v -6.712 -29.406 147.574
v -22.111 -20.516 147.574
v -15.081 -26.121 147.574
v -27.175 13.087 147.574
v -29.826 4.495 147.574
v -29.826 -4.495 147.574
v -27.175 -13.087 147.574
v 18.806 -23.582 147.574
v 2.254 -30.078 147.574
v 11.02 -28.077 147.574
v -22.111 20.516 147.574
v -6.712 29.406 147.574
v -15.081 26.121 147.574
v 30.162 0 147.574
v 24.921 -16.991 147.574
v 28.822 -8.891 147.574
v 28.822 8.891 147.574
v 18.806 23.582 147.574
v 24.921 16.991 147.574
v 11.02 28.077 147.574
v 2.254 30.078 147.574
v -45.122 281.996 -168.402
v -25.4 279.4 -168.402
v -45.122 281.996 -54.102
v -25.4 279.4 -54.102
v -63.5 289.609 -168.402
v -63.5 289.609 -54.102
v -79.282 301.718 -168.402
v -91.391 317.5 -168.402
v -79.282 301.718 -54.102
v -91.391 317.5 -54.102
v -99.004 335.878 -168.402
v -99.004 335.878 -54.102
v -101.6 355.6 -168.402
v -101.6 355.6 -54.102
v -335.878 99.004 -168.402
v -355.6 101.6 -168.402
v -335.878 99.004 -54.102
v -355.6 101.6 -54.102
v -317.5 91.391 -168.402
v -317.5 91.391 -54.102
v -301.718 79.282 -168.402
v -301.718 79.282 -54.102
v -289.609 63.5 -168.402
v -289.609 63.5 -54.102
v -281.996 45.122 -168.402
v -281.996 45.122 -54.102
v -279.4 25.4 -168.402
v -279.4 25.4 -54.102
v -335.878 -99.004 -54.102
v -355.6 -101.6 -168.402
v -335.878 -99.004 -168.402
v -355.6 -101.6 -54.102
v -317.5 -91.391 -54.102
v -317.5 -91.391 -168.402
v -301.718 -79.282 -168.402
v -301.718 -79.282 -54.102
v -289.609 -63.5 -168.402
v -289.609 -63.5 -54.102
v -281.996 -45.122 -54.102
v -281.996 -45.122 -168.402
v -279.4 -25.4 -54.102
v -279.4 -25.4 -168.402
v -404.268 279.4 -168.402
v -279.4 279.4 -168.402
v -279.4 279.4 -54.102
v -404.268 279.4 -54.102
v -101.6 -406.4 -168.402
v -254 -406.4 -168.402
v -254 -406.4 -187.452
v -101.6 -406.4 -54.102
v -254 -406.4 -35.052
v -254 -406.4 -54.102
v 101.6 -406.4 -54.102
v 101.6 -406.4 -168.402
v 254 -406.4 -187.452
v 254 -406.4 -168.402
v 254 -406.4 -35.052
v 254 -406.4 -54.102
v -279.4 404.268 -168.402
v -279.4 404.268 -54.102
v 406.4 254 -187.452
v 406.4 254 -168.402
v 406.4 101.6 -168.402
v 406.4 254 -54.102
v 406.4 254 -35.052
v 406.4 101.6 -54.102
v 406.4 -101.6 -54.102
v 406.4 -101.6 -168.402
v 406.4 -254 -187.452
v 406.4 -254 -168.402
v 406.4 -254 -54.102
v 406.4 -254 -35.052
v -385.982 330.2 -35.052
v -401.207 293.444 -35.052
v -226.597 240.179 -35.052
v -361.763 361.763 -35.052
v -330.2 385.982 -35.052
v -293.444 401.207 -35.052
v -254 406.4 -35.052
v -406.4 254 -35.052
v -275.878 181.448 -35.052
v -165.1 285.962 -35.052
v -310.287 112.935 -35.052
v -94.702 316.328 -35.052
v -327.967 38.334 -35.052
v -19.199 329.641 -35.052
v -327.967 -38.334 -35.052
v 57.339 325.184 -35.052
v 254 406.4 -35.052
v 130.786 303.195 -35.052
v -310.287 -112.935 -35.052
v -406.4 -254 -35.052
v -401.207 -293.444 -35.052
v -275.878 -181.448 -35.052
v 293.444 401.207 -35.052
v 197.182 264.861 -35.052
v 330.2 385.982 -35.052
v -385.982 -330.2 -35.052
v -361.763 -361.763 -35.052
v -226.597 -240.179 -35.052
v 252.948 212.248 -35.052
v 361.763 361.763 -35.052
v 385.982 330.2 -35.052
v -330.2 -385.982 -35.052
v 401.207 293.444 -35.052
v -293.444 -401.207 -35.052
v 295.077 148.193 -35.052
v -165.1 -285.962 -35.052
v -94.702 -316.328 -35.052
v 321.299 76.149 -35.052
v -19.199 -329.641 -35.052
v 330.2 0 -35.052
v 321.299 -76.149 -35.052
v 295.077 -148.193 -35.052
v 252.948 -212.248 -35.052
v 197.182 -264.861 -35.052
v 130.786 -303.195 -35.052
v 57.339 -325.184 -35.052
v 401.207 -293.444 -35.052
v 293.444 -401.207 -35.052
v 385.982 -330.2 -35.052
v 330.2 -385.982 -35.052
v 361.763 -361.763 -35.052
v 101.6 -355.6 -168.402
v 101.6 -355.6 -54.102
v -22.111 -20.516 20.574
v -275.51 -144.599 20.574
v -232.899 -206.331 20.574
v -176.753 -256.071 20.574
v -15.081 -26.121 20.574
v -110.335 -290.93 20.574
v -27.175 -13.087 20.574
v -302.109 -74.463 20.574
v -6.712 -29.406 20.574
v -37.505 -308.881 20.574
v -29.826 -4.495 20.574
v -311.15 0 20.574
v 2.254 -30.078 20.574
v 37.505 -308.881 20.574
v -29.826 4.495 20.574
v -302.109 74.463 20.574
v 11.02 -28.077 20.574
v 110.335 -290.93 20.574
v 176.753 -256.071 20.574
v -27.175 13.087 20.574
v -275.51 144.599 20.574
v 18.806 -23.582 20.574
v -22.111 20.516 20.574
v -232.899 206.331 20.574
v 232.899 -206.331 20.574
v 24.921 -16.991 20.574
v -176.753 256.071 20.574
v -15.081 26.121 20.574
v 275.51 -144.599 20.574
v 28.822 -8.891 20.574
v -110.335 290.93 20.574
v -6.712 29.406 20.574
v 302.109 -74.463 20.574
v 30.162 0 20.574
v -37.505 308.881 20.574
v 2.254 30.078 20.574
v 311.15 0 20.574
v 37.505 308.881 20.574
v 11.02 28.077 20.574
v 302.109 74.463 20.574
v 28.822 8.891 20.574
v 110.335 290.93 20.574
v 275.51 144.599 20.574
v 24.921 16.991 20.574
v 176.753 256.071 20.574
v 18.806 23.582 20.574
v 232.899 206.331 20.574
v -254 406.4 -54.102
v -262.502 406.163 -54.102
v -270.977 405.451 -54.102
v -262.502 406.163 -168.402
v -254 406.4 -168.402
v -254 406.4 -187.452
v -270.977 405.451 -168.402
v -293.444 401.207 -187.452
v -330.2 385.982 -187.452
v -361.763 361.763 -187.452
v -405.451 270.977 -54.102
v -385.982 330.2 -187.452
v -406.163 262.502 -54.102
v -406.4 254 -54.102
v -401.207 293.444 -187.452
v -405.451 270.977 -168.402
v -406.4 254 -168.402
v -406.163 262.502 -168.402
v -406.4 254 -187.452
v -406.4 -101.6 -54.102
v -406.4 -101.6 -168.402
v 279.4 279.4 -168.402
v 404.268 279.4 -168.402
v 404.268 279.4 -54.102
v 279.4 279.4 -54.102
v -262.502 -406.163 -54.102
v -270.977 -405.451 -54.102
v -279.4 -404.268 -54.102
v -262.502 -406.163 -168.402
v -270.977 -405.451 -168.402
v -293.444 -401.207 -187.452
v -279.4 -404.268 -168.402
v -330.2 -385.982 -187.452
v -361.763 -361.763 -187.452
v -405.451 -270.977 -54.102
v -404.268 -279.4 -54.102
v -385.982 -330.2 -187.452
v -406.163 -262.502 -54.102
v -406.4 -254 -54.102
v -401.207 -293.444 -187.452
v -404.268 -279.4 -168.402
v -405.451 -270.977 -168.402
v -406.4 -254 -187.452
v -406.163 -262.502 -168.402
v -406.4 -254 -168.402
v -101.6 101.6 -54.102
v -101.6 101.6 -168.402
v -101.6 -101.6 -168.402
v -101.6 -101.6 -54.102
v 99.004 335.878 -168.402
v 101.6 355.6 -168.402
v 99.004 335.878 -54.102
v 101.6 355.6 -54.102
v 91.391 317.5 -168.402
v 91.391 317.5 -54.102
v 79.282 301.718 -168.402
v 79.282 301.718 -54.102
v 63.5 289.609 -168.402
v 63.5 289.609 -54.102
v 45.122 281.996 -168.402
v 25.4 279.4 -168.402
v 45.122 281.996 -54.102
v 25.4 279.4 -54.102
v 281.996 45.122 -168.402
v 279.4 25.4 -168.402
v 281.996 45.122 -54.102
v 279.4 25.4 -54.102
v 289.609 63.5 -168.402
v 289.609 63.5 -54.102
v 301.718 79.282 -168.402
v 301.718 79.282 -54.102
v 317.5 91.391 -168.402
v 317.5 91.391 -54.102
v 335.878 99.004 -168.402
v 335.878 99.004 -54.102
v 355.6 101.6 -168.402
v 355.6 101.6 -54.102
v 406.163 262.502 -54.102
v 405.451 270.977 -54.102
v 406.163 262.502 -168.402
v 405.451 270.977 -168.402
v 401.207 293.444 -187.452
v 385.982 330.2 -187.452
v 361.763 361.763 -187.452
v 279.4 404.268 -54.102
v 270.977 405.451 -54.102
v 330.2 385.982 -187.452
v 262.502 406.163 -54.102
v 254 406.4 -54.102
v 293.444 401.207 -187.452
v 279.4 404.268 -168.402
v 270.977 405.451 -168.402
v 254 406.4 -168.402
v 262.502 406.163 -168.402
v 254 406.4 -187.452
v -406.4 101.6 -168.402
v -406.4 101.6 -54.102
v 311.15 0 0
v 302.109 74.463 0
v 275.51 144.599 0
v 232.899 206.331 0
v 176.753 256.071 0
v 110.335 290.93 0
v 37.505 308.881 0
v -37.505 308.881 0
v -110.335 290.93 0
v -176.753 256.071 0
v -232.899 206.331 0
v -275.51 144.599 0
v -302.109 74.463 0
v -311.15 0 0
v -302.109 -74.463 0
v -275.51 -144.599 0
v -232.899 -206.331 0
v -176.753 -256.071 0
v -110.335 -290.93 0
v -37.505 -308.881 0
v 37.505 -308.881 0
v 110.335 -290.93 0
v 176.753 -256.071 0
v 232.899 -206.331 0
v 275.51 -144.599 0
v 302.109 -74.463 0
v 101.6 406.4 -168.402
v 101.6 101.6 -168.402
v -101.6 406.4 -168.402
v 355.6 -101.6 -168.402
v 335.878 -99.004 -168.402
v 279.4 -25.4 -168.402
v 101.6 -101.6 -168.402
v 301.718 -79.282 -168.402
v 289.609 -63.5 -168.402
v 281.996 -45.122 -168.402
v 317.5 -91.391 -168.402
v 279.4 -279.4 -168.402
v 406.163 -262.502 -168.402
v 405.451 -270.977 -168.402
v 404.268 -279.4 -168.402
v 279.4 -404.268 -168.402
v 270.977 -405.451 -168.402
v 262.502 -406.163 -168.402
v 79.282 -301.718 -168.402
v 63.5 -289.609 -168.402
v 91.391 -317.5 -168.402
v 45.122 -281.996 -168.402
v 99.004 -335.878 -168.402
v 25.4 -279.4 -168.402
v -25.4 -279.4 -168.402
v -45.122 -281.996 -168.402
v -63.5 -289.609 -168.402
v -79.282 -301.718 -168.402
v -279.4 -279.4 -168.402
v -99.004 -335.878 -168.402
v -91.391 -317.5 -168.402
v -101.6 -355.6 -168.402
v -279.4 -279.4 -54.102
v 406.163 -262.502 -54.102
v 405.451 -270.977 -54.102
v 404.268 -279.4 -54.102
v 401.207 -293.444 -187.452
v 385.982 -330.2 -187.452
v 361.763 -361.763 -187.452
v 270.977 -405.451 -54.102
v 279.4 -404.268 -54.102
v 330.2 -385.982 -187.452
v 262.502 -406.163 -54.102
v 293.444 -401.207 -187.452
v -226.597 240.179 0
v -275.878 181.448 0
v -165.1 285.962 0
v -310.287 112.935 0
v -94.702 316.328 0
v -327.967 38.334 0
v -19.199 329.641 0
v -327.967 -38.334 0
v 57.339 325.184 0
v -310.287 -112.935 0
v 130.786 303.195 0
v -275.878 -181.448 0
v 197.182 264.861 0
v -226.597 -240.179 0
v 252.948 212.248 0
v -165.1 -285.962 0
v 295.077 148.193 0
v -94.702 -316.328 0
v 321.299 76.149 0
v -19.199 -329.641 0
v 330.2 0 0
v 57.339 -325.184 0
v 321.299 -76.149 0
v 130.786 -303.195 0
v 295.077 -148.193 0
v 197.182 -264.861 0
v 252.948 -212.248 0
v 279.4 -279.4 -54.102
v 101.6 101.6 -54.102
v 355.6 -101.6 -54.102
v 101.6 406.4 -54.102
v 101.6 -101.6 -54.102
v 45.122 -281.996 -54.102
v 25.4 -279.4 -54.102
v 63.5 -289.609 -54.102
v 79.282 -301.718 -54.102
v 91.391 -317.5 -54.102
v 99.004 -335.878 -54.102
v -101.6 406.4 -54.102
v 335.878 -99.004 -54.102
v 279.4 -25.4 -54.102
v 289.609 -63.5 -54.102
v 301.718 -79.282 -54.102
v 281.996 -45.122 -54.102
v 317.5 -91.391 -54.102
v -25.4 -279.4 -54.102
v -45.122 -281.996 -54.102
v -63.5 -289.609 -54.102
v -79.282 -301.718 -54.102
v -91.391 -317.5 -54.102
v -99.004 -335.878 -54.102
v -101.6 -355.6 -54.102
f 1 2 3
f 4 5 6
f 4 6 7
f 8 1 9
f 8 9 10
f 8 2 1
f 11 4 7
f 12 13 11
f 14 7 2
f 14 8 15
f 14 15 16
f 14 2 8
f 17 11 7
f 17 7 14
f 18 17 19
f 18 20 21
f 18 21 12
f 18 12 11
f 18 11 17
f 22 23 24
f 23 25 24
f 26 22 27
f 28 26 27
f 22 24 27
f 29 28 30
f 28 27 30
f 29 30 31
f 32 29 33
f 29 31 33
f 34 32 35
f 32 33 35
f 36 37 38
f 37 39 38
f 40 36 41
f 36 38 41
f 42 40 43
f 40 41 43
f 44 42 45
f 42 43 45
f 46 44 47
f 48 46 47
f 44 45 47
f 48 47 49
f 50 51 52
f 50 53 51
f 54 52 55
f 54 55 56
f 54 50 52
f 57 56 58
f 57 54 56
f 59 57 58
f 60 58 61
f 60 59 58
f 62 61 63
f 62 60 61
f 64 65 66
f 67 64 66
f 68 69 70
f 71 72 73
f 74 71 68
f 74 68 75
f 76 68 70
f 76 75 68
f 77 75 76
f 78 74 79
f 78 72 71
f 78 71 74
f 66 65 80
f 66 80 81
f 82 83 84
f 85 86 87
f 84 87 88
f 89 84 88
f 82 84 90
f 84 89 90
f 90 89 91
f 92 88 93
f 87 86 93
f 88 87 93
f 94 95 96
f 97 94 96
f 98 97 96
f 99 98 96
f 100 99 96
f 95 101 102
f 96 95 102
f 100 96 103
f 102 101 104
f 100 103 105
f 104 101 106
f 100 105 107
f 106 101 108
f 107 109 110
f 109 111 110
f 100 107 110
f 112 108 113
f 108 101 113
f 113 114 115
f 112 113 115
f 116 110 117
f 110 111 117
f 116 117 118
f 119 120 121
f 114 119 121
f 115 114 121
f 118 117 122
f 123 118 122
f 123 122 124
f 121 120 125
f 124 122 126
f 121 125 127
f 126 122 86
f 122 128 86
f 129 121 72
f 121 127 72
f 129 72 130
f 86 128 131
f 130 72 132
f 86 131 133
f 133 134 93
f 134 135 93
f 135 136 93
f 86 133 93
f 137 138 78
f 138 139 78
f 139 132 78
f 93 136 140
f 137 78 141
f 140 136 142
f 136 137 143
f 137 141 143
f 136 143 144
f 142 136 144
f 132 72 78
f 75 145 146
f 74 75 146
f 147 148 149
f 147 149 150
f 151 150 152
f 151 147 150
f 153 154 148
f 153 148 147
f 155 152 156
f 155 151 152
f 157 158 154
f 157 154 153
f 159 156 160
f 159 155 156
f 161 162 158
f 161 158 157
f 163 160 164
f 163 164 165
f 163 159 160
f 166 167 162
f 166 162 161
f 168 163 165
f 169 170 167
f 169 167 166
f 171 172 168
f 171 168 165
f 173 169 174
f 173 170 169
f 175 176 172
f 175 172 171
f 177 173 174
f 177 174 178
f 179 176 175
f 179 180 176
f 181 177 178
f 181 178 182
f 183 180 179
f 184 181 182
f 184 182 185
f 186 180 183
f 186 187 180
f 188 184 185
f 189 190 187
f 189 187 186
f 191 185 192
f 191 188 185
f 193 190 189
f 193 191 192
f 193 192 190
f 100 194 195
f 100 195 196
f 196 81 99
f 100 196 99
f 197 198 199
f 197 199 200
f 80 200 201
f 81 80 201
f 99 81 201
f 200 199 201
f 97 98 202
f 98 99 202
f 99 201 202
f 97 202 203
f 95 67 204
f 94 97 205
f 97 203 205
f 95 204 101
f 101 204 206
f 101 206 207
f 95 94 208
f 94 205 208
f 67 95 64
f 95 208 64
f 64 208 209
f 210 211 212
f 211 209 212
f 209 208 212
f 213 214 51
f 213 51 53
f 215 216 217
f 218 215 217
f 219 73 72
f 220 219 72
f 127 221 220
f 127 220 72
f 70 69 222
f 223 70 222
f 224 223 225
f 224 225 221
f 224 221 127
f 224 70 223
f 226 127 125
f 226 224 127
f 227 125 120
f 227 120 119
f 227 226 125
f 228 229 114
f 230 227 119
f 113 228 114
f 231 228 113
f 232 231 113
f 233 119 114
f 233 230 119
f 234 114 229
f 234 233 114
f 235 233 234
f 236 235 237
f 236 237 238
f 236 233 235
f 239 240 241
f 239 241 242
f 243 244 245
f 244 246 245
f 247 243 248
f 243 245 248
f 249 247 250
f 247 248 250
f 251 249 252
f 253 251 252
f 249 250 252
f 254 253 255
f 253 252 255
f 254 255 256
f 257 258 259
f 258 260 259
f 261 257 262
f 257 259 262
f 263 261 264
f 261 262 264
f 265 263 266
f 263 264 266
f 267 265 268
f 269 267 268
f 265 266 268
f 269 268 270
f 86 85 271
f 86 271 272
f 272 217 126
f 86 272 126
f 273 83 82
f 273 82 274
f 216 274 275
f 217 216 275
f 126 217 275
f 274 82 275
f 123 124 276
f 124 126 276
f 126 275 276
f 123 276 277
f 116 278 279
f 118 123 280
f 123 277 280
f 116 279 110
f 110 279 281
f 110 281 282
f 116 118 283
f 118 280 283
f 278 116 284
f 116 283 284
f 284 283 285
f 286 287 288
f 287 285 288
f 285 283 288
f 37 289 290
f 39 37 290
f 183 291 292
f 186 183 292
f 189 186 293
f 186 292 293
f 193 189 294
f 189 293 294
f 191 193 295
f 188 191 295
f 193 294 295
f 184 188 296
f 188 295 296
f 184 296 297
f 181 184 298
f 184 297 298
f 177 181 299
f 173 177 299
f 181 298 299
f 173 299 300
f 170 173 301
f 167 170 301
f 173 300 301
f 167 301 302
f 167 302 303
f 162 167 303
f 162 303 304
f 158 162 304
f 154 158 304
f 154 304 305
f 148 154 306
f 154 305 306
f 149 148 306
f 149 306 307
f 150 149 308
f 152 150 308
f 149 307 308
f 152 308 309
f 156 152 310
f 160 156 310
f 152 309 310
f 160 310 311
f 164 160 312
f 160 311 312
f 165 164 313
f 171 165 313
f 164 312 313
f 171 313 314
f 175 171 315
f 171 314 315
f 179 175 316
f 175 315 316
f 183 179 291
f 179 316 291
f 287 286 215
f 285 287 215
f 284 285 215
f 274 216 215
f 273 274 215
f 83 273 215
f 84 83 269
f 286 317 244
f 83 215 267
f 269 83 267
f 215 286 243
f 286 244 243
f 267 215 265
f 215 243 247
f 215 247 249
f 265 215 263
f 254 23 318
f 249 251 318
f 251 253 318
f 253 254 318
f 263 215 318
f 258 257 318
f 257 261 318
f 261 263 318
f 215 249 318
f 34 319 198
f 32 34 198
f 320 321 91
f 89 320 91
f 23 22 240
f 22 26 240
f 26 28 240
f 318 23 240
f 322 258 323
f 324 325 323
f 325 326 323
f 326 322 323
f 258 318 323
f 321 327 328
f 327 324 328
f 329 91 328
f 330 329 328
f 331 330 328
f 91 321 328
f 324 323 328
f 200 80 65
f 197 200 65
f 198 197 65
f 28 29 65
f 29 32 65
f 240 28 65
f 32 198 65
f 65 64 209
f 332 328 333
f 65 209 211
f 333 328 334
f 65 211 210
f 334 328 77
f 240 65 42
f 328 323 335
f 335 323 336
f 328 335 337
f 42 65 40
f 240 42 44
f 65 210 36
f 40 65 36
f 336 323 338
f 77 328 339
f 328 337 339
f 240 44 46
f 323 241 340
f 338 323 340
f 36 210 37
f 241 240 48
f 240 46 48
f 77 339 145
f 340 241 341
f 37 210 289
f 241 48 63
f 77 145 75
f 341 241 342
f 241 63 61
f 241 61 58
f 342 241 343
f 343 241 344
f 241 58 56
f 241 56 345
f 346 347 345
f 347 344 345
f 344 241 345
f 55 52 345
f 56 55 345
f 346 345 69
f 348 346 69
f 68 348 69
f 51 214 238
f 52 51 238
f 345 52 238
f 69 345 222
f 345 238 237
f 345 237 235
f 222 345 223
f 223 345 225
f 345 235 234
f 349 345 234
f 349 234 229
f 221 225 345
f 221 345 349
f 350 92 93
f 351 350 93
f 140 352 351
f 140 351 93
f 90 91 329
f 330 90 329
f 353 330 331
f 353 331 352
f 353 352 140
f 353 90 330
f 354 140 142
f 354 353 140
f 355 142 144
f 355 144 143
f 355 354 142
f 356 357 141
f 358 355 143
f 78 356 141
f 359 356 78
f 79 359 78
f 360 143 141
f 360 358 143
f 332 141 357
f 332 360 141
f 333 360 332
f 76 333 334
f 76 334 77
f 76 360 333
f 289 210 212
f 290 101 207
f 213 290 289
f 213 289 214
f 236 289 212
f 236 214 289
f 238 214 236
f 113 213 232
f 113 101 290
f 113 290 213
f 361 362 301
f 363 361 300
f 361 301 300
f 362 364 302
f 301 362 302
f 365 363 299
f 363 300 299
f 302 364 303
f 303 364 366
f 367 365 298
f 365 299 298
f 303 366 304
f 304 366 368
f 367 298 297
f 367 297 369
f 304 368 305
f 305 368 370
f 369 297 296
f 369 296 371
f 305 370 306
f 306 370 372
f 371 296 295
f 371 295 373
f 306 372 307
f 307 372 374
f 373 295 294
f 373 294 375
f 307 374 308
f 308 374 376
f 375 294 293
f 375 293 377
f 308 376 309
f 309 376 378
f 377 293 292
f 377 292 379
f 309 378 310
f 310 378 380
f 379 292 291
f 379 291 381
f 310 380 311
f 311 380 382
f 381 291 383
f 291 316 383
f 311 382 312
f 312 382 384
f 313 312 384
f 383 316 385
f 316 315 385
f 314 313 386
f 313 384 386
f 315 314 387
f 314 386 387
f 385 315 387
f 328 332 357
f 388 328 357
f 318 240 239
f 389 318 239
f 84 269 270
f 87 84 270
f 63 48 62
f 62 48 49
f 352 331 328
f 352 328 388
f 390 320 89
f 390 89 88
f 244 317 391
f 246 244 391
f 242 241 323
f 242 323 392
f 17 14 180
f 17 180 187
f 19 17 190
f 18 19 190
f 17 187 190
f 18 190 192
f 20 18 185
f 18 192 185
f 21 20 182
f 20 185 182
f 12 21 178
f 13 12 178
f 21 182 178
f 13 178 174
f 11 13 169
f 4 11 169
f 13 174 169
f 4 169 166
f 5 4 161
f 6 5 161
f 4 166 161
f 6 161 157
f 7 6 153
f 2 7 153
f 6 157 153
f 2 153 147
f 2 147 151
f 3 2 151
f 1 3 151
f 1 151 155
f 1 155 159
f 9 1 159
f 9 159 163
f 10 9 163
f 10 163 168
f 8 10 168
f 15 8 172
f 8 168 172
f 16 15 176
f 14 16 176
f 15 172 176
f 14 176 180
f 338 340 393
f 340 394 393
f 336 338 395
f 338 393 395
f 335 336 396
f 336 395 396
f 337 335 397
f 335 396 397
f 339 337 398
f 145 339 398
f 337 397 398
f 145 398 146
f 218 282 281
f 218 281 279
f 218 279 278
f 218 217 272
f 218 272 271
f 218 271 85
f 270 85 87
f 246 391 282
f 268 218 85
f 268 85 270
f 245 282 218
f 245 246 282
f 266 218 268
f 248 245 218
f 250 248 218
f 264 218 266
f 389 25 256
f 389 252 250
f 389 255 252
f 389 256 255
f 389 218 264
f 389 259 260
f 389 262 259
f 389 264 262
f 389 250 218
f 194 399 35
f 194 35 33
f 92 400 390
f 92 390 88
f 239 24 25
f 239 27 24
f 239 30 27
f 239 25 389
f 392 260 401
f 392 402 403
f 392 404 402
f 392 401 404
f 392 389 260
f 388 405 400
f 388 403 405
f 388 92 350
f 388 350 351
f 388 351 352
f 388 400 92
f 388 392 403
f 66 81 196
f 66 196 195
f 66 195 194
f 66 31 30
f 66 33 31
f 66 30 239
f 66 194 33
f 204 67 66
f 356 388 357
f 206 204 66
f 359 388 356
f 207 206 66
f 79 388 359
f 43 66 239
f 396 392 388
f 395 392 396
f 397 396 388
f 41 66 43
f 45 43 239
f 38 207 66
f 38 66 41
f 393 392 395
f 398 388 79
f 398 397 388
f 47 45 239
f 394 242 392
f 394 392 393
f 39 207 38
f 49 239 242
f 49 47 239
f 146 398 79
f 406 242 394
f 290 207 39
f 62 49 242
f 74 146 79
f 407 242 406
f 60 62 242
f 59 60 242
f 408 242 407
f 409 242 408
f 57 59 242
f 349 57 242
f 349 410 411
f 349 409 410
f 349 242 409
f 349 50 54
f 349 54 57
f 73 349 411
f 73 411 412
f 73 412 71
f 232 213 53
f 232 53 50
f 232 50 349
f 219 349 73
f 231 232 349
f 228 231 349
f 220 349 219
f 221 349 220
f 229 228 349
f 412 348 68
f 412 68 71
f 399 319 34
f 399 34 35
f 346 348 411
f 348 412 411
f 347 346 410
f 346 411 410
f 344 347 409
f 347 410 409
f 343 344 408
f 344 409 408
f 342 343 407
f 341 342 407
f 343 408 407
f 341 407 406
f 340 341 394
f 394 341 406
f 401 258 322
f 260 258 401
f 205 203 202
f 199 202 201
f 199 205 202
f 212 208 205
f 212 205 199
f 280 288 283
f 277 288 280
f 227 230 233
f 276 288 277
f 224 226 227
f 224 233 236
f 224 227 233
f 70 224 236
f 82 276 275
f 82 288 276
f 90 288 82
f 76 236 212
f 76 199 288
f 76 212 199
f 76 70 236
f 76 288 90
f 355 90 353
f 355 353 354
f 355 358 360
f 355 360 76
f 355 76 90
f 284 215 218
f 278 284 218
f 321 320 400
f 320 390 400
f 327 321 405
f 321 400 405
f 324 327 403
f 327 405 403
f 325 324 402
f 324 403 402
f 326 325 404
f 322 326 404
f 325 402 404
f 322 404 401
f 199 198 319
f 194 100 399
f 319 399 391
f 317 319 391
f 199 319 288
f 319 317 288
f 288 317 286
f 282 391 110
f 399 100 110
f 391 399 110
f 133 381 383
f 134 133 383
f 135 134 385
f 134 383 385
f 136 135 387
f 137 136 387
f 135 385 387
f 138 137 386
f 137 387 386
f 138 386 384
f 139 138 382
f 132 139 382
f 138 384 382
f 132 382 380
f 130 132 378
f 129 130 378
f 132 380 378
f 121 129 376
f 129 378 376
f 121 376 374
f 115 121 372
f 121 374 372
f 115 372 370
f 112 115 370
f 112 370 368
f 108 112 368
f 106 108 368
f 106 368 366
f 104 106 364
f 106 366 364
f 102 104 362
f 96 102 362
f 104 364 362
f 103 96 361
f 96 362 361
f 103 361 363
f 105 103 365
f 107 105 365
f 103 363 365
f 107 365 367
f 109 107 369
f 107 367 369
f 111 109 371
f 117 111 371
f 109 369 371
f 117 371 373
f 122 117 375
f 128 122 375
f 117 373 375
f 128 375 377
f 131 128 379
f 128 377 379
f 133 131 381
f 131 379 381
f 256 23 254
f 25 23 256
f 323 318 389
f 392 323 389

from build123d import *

# Parameters (mm, degrees)
F0_R         = 311.15
F1_DEPTH     = 20.574
F2_R         = 330.2
F3_DEPTH     = 35.052
F4_W         = 812.8
F4_H         = 812.8
F5_DEPTH     = 152.4
F6_W         = 177.8
F6_H         = 114.3
F7_DEPTH     = 812.801
F8_W         = 177.8
F8_H         = 114.3
F9_DEPTH     = 812.801
F10_T1_DEPTH = 914.4
F11_R        = 76.2
F12_R        = 30.1625
F13_DEPTH    = 127


# Not quite as in the source:
# - a fillet or chamfer that OpenCascade refuses, or shapes differently, is made with other operations: its cross-section is extruded or revolved along the edge and cut away or added


with BuildPart() as f1:
    # F0 (on Top) → F1 (new body)
    with BuildSketch(Plane.XY):
        Circle(F0_R)
    extrude(amount=F1_DEPTH)

    # F2 (on face) → F3 (join)
    with BuildSketch(Plane(origin=(0, 0, 0), x_dir=(1, 0, 0), z_dir=(0, 0, -1))):
        Circle(F2_R)
    extrude(amount=F3_DEPTH)

    # F4 (on face) → F5 (join)
    with BuildSketch(Plane(origin=(0, 0, -35.052), x_dir=(1, 0, 0), z_dir=(0, 0, -1))):
        Rectangle(F4_W, F4_H)
    extrude(amount=F5_DEPTH)

    # F6 (on face) → F7 (cut, through all)
    with BuildSketch(Plane(origin=(0, 406.4, 0), x_dir=(-1, 0, 0), z_dir=(0, 1, 0))):
        with Locations((190.5, -111.252)):
            Rectangle(F6_W, F6_H)
        with Locations((-190.5, -111.252)):
            Rectangle(F6_W, F6_H)
    extrude(amount=-F7_DEPTH, mode=Mode.SUBTRACT)

    # F8 (on face) → F9 (cut, through all)
    with BuildSketch(Plane(origin=(-406.4, 0, 0), x_dir=(0, -1, 0), z_dir=(-1, 0, 0))):
        with Locations((190.5, -111.252)):
            Rectangle(F8_W, F8_H)
        with Locations((-190.5, -111.252)):
            Rectangle(F8_W, F8_H)
    extrude(amount=-F9_DEPTH, mode=Mode.SUBTRACT)

    # F10: fillet of radius 152.4 on 4 edges, made by hand

    # F10_s2 → F10_t1 (cut)
    with BuildSketch(Plane.XY.offset(-568.452)):
        with BuildLine():
            ThreePointArc((-254, -406.4), (-361.7630734528, -361.7630734528), (-406.4, -254))
            Line((-406.4, -254), (-406.4, -406.4))
            Line((-406.4, -406.4), (-254, -406.4))
        make_face()
        with BuildLine():
            ThreePointArc((-254, 406.4), (-361.7630734528, 361.7630734528), (-406.4, 254))
            Line((-406.4, 254), (-406.4, 406.4))
            Line((-406.4, 406.4), (-254, 406.4))
        make_face()
        with BuildLine():
            ThreePointArc((406.4, 254), (361.7630734528, 361.7630734528), (254, 406.4))
            Line((254, 406.4), (406.4, 406.4))
            Line((406.4, 406.4), (406.4, 254))
        make_face()
        with BuildLine():
            ThreePointArc((406.4, -254), (361.7630734528, -361.7630734528), (254, -406.4))
            Line((254, -406.4), (406.4, -406.4))
            Line((406.4, -406.4), (406.4, -254))
        make_face()
    extrude(amount=F10_T1_DEPTH, mode=Mode.SUBTRACT)

    # F11
    f11_edges = [f1.edges().sort_by_distance(p)[0] for p in [
        (279.4, -101.6, -111.252),
        (279.4, 101.6, -111.252),
        (101.6, 279.4, -111.252),
        (-101.6, 279.4, -111.252),
        (-279.4, 101.6, -111.252),
        (-279.4, -101.6, -111.252),
        (-101.6, -279.4, -111.252),
        (101.6, -279.4, -111.252),
    ]]
    fillet(f11_edges, radius=F11_R)

    # F12 (on face) → F13 (join)
    with BuildSketch(Plane.XY.offset(20.574)):
        Circle(F12_R)
    extrude(amount=F13_DEPTH)


solid = f1.part
